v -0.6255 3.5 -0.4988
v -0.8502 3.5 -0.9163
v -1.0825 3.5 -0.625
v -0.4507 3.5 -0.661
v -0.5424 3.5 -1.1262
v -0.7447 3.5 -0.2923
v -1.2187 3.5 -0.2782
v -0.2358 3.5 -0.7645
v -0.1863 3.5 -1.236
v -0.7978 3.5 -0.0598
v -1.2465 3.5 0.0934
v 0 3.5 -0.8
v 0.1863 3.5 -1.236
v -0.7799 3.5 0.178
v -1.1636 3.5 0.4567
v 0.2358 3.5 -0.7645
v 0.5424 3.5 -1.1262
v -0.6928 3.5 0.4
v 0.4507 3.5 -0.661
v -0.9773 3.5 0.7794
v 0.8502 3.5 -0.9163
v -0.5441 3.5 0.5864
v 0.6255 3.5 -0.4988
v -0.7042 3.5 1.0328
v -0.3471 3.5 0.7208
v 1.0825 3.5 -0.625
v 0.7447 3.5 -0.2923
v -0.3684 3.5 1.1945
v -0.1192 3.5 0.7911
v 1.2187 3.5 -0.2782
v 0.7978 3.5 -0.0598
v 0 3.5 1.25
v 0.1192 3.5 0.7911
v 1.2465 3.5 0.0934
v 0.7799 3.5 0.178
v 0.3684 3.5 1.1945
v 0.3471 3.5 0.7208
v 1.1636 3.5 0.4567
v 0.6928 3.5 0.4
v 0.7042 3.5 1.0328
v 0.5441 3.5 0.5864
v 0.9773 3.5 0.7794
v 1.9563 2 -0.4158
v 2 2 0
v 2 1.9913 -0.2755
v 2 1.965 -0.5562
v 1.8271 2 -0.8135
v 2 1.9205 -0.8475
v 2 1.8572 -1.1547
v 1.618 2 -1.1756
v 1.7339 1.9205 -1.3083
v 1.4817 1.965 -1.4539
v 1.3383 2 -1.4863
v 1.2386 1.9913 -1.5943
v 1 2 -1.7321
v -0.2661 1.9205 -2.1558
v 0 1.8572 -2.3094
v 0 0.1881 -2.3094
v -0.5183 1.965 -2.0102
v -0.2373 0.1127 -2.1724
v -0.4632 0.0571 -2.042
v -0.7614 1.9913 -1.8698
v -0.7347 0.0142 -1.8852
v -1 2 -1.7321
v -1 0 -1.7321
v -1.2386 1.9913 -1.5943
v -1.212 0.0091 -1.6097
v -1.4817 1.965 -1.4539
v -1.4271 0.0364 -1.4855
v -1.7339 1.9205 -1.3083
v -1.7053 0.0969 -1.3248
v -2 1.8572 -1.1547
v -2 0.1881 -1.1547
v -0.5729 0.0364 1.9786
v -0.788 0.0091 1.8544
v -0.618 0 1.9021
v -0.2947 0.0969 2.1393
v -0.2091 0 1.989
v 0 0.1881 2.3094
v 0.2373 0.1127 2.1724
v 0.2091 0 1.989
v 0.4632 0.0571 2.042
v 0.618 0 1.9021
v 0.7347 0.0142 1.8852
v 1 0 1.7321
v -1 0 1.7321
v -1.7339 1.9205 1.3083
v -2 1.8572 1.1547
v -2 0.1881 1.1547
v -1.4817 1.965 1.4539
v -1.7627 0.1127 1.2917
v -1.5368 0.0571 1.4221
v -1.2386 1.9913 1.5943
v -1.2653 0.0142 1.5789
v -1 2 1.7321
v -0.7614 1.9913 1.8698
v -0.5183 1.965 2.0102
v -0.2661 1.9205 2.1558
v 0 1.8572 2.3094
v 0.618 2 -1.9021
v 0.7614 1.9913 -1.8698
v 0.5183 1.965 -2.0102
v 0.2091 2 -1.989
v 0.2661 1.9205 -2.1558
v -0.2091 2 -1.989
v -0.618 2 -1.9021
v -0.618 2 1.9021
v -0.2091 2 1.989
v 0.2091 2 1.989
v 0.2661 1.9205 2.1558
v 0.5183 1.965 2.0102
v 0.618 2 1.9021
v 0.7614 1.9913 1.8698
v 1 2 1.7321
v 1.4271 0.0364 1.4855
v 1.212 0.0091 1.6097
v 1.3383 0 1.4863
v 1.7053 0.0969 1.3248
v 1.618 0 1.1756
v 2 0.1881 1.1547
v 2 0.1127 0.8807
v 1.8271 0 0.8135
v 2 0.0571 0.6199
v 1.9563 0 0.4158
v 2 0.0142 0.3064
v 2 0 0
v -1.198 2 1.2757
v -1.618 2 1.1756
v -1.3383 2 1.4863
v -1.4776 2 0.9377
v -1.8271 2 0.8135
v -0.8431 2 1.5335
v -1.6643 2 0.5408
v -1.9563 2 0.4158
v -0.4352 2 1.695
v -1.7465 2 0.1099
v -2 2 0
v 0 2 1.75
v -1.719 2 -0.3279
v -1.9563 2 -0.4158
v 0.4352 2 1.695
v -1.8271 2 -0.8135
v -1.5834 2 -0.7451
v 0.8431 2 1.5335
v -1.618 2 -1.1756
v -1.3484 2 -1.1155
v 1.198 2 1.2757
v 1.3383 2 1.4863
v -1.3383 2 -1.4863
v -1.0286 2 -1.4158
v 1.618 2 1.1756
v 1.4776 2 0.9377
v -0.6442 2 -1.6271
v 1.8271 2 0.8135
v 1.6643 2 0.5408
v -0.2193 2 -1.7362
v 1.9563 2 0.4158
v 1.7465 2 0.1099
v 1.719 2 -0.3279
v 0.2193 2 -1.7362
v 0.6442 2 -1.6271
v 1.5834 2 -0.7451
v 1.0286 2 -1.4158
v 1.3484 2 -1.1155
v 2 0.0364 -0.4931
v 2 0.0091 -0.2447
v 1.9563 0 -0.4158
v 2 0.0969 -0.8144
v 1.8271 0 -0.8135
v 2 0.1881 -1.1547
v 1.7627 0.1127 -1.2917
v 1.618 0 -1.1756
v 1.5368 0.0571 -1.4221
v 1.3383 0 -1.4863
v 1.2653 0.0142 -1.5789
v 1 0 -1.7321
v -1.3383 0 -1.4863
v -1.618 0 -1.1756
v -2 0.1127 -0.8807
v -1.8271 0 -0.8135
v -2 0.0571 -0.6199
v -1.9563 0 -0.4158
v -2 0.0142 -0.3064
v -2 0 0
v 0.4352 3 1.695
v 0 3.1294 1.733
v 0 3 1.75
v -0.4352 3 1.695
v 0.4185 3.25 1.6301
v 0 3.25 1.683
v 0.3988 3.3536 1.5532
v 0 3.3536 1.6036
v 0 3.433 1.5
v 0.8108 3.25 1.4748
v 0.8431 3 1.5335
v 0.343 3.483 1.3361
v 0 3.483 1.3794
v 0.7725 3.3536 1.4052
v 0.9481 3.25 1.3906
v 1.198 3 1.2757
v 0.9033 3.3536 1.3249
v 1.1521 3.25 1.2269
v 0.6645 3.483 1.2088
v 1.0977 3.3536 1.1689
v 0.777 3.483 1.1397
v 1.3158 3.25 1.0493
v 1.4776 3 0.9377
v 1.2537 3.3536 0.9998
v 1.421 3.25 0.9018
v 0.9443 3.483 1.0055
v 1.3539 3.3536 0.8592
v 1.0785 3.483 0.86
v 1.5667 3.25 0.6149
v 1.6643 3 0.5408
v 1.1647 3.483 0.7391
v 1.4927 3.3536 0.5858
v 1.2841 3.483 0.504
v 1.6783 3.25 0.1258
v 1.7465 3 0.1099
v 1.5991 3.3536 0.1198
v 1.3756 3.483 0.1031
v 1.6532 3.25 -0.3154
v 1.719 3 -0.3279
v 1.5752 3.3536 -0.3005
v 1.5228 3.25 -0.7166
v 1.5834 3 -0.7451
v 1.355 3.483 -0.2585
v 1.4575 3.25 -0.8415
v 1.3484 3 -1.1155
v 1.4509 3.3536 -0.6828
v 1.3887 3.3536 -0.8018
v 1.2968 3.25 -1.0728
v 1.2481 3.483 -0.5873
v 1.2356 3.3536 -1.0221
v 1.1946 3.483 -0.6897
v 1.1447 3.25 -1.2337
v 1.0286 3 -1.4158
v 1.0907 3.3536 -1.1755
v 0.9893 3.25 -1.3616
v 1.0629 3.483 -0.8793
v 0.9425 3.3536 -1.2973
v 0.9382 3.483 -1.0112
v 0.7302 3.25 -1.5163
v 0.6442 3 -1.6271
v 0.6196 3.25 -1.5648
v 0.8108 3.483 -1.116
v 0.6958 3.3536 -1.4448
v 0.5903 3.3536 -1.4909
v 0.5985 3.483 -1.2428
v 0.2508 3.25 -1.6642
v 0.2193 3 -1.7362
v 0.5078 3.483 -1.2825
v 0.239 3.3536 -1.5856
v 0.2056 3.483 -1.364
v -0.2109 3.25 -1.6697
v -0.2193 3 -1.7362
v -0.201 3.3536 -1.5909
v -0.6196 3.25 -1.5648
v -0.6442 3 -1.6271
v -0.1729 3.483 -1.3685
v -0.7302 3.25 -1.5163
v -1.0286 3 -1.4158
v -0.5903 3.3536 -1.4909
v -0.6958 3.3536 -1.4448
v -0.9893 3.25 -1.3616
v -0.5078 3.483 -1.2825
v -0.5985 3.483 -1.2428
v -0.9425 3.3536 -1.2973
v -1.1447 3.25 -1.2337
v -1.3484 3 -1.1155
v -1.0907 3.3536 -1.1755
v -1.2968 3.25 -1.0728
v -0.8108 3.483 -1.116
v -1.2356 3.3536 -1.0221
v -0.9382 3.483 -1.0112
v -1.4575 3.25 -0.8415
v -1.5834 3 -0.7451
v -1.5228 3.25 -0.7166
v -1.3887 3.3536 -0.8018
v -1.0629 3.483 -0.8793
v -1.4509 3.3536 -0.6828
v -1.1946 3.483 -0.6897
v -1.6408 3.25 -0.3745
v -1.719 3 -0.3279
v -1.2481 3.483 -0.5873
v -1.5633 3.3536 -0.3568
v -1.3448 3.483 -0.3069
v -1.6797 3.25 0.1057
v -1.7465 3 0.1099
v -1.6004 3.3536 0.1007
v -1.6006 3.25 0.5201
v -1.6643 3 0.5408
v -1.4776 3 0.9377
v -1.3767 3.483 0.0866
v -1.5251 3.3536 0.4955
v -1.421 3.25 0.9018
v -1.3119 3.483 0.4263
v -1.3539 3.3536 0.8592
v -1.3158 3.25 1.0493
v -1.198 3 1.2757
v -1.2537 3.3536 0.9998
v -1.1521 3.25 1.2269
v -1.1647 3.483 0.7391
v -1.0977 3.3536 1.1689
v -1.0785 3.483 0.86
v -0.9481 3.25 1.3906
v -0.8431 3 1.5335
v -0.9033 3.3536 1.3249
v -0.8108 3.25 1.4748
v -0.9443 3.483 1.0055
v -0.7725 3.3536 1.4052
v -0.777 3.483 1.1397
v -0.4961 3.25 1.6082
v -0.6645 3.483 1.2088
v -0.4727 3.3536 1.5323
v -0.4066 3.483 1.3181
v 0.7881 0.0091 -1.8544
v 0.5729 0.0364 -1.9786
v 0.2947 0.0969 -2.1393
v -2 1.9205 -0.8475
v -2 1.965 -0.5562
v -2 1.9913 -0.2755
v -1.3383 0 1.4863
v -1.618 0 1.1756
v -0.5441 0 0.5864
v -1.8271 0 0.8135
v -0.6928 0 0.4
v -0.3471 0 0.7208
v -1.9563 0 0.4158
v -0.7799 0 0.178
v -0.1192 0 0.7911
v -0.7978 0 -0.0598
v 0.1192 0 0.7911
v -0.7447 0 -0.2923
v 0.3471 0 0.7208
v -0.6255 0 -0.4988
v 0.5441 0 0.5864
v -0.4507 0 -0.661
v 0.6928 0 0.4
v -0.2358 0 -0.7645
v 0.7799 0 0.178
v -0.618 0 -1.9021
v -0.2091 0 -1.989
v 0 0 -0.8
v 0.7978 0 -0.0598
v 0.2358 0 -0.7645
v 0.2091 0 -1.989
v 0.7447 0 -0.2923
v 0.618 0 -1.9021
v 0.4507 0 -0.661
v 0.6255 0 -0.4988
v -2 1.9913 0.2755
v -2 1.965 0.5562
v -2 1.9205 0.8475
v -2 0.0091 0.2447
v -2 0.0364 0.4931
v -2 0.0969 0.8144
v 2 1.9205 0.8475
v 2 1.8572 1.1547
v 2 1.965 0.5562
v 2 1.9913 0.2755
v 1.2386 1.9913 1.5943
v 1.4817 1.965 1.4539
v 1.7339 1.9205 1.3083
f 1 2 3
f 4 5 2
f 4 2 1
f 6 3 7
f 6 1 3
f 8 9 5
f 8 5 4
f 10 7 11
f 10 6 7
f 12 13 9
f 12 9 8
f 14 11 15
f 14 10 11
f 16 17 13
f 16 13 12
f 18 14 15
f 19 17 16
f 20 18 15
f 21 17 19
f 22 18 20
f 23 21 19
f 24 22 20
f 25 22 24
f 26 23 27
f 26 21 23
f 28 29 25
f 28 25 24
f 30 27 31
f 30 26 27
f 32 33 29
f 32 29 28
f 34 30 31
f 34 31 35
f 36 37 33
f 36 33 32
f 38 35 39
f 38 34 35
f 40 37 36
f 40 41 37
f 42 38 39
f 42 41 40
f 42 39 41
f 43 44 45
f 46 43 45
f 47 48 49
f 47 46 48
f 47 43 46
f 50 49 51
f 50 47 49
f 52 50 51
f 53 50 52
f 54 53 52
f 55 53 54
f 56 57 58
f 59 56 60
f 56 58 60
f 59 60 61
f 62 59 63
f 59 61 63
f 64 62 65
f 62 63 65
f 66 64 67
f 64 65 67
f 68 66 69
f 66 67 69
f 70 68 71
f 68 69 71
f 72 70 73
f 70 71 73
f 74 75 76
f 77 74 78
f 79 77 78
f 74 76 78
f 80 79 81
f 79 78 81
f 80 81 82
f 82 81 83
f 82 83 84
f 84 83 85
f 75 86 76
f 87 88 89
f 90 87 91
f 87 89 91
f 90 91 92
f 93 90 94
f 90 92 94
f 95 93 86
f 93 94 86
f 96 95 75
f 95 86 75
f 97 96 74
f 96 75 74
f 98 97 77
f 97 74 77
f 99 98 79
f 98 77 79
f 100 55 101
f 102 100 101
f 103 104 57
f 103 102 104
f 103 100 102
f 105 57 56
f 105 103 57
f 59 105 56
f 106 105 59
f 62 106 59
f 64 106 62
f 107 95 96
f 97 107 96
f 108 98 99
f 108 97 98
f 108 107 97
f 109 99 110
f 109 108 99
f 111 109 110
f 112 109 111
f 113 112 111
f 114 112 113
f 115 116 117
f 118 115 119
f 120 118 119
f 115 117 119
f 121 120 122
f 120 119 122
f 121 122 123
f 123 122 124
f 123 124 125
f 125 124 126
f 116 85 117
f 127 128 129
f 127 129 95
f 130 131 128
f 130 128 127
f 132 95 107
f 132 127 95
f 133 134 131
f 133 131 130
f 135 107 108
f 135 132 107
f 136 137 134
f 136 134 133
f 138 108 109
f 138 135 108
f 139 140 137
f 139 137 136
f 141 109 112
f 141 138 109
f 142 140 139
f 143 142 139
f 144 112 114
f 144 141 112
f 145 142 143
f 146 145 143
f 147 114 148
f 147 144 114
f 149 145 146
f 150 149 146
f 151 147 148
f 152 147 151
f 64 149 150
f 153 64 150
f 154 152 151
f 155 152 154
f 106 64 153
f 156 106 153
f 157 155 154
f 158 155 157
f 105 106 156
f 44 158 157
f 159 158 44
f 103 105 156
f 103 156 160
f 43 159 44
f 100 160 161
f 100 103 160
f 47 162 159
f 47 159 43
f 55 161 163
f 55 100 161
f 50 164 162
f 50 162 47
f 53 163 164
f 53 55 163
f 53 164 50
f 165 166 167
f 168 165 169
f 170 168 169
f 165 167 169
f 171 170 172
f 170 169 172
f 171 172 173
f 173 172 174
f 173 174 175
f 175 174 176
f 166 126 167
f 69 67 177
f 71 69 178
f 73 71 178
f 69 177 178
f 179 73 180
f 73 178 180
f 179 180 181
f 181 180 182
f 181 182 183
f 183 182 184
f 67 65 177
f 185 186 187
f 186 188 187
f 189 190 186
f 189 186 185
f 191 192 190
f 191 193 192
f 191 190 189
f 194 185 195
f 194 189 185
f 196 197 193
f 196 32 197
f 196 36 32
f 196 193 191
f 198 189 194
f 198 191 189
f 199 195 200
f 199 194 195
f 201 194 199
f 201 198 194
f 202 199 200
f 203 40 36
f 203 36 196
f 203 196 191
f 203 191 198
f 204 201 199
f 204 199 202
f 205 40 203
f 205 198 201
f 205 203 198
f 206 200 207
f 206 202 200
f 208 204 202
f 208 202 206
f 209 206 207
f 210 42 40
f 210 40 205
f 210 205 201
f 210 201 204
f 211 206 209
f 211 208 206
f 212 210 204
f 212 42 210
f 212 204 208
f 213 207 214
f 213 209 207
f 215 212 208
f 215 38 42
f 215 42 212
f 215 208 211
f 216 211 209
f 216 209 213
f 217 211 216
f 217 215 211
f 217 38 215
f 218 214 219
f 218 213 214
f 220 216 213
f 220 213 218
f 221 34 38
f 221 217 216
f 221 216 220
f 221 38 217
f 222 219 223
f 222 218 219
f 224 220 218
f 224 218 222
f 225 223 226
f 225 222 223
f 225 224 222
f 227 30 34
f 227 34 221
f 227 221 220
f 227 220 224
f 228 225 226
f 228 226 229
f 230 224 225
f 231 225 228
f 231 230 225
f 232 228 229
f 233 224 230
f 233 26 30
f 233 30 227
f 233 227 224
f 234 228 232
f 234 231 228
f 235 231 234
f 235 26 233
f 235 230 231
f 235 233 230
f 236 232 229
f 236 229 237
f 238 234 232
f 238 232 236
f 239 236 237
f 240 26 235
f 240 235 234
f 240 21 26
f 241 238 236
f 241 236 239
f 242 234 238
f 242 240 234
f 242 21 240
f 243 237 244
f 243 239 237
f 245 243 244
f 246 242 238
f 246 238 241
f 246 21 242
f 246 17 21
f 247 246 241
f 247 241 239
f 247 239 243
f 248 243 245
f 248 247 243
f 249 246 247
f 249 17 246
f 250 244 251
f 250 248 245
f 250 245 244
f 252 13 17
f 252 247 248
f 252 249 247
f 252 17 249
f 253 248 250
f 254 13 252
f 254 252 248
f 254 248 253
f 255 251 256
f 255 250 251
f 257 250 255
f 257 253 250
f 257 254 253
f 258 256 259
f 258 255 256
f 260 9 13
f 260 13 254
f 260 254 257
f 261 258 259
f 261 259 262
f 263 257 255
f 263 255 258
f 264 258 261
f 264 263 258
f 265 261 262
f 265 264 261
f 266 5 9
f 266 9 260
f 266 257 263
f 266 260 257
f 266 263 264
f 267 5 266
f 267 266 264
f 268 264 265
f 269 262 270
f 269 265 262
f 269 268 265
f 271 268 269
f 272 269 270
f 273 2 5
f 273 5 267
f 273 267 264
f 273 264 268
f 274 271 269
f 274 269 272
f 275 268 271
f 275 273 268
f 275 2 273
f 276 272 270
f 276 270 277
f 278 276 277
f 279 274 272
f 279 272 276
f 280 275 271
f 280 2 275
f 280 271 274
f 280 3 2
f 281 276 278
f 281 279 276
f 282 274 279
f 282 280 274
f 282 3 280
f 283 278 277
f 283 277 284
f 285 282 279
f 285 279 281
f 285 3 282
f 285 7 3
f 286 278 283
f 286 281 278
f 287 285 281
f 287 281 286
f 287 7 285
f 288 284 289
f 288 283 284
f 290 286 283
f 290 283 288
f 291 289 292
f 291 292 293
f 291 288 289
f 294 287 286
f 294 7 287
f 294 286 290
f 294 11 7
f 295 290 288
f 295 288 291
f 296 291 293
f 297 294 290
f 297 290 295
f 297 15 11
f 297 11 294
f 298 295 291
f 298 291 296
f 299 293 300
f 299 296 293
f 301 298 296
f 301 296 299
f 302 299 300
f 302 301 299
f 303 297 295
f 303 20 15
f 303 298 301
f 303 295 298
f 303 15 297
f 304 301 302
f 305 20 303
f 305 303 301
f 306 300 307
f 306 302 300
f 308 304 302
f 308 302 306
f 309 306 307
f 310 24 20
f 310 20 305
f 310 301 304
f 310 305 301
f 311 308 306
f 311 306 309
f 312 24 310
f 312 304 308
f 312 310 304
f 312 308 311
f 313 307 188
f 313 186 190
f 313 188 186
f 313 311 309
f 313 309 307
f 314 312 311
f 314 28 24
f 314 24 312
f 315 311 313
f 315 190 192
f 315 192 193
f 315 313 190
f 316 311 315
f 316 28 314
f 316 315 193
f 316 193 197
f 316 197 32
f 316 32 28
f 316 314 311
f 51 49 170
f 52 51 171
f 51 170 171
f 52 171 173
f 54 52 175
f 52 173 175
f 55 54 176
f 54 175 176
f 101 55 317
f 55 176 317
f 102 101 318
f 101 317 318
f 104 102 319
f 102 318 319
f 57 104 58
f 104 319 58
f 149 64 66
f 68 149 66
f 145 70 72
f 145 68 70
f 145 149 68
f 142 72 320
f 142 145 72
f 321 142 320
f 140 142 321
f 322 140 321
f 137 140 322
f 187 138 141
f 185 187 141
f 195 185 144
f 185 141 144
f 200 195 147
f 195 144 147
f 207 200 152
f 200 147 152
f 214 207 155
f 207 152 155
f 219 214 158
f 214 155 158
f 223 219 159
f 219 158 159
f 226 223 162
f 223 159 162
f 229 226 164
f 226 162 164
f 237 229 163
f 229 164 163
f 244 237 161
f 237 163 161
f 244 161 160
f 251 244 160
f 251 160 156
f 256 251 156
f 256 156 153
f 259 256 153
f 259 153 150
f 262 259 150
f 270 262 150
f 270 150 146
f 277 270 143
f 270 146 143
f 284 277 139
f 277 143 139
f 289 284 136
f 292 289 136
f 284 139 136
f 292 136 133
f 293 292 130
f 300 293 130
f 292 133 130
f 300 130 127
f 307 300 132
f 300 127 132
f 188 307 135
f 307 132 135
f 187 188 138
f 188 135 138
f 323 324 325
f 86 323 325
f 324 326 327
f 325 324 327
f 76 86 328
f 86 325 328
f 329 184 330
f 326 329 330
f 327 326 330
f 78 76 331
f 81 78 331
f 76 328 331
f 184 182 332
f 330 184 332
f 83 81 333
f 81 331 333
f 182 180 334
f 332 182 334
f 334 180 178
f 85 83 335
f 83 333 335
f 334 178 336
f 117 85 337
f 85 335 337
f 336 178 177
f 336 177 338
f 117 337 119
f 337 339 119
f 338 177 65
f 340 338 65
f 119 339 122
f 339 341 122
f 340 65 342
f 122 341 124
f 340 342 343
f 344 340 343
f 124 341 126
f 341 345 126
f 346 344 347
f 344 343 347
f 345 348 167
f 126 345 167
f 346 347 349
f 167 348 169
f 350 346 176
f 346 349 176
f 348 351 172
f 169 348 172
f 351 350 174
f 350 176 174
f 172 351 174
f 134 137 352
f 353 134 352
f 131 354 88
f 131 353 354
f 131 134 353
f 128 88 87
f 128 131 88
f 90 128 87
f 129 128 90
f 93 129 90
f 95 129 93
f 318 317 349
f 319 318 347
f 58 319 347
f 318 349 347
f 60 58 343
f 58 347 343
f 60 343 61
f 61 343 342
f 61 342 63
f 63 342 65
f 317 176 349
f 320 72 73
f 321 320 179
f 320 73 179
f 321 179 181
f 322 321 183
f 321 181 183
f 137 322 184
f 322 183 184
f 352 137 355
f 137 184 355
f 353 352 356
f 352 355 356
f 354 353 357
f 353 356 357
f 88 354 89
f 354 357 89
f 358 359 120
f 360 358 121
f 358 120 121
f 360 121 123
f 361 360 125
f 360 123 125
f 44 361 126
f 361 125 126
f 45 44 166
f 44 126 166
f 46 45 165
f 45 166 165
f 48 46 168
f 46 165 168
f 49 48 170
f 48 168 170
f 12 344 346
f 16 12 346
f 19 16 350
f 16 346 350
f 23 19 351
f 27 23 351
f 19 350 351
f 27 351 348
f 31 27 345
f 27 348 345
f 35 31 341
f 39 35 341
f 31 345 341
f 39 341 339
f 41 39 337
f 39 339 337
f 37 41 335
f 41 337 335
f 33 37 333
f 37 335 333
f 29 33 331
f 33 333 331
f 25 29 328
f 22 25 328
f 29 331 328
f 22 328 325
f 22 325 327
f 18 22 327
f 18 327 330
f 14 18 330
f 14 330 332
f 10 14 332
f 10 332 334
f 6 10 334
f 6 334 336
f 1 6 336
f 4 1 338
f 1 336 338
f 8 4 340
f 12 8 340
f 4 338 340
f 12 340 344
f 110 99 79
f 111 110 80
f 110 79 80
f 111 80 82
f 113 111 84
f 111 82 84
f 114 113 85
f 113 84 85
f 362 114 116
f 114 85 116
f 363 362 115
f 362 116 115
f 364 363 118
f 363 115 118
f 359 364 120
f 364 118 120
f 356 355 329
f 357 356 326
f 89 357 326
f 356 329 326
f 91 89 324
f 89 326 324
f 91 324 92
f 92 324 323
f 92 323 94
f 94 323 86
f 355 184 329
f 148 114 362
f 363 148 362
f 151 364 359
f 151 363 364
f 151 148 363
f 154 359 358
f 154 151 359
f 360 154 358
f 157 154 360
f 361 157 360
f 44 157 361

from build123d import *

# Parameters (mm, degrees)
EXTRUDE_1_DEPTH     = 2
SKETCH_2_R          = 1.75
EXTRUDE_2_DEPTH     = 1.5
FILLET_1_R          = 0.5
SKETCH_3_R          = 0.8
CUT_EXTRUDE_1_DEPTH = 3.5


with BuildPart() as part:
    # 草图1 → 凸台-拉伸1 (new body)
    with BuildSketch(Plane(origin=(0, 0, 0), x_dir=(1, 0, 0), z_dir=(0, 1, 0))):
        Polygon((2, 1.154700538), (0, 2.309401077), (-2, 1.154700538), (-2, -1.154700538), (0, -2.309401077), (2, -1.154700538), align=None)
    extrude(amount=EXTRUDE_1_DEPTH)

    # 草图2 → 凸台-拉伸2 (add)
    with BuildSketch(Plane(origin=(0, 2, 0), x_dir=(1, 0, 0), z_dir=(0, 1, 0))):
        with Locations(Location((0, 0, 0), (0, 0, 270))):
            Circle(SKETCH_2_R)
    extrude(amount=EXTRUDE_2_DEPTH)

    # 圆角1
    fillet_1_edges = [part.edges().sort_by_distance(p)[0] for p in [
        (0, 3.5, -1.75),
    ]]
    fillet(fillet_1_edges, radius=FILLET_1_R)

    # 草图3 → 切除-拉伸1 (cut)
    with BuildSketch(Plane.XZ):
        with Locations(Location((0, 0, 0), (0, 0, 270))):
            Circle(SKETCH_3_R)
    extrude(amount=-CUT_EXTRUDE_1_DEPTH, mode=Mode.SUBTRACT)

    # 草图4 → 切除-旋转1 (revolve, cut)
    with BuildSketch(Plane.XY):
        Polygon((3.454158992, 0), (3.454158992, 0.884050335), (2, 0), align=None)
        Polygon((2, 2), (3.454158992, 2), (3.454158992, 1.328835078), align=None)
    revolve(axis=Axis((0, 0, 0), (0, 1, 0)), mode=Mode.SUBTRACT)


solid = part.part
